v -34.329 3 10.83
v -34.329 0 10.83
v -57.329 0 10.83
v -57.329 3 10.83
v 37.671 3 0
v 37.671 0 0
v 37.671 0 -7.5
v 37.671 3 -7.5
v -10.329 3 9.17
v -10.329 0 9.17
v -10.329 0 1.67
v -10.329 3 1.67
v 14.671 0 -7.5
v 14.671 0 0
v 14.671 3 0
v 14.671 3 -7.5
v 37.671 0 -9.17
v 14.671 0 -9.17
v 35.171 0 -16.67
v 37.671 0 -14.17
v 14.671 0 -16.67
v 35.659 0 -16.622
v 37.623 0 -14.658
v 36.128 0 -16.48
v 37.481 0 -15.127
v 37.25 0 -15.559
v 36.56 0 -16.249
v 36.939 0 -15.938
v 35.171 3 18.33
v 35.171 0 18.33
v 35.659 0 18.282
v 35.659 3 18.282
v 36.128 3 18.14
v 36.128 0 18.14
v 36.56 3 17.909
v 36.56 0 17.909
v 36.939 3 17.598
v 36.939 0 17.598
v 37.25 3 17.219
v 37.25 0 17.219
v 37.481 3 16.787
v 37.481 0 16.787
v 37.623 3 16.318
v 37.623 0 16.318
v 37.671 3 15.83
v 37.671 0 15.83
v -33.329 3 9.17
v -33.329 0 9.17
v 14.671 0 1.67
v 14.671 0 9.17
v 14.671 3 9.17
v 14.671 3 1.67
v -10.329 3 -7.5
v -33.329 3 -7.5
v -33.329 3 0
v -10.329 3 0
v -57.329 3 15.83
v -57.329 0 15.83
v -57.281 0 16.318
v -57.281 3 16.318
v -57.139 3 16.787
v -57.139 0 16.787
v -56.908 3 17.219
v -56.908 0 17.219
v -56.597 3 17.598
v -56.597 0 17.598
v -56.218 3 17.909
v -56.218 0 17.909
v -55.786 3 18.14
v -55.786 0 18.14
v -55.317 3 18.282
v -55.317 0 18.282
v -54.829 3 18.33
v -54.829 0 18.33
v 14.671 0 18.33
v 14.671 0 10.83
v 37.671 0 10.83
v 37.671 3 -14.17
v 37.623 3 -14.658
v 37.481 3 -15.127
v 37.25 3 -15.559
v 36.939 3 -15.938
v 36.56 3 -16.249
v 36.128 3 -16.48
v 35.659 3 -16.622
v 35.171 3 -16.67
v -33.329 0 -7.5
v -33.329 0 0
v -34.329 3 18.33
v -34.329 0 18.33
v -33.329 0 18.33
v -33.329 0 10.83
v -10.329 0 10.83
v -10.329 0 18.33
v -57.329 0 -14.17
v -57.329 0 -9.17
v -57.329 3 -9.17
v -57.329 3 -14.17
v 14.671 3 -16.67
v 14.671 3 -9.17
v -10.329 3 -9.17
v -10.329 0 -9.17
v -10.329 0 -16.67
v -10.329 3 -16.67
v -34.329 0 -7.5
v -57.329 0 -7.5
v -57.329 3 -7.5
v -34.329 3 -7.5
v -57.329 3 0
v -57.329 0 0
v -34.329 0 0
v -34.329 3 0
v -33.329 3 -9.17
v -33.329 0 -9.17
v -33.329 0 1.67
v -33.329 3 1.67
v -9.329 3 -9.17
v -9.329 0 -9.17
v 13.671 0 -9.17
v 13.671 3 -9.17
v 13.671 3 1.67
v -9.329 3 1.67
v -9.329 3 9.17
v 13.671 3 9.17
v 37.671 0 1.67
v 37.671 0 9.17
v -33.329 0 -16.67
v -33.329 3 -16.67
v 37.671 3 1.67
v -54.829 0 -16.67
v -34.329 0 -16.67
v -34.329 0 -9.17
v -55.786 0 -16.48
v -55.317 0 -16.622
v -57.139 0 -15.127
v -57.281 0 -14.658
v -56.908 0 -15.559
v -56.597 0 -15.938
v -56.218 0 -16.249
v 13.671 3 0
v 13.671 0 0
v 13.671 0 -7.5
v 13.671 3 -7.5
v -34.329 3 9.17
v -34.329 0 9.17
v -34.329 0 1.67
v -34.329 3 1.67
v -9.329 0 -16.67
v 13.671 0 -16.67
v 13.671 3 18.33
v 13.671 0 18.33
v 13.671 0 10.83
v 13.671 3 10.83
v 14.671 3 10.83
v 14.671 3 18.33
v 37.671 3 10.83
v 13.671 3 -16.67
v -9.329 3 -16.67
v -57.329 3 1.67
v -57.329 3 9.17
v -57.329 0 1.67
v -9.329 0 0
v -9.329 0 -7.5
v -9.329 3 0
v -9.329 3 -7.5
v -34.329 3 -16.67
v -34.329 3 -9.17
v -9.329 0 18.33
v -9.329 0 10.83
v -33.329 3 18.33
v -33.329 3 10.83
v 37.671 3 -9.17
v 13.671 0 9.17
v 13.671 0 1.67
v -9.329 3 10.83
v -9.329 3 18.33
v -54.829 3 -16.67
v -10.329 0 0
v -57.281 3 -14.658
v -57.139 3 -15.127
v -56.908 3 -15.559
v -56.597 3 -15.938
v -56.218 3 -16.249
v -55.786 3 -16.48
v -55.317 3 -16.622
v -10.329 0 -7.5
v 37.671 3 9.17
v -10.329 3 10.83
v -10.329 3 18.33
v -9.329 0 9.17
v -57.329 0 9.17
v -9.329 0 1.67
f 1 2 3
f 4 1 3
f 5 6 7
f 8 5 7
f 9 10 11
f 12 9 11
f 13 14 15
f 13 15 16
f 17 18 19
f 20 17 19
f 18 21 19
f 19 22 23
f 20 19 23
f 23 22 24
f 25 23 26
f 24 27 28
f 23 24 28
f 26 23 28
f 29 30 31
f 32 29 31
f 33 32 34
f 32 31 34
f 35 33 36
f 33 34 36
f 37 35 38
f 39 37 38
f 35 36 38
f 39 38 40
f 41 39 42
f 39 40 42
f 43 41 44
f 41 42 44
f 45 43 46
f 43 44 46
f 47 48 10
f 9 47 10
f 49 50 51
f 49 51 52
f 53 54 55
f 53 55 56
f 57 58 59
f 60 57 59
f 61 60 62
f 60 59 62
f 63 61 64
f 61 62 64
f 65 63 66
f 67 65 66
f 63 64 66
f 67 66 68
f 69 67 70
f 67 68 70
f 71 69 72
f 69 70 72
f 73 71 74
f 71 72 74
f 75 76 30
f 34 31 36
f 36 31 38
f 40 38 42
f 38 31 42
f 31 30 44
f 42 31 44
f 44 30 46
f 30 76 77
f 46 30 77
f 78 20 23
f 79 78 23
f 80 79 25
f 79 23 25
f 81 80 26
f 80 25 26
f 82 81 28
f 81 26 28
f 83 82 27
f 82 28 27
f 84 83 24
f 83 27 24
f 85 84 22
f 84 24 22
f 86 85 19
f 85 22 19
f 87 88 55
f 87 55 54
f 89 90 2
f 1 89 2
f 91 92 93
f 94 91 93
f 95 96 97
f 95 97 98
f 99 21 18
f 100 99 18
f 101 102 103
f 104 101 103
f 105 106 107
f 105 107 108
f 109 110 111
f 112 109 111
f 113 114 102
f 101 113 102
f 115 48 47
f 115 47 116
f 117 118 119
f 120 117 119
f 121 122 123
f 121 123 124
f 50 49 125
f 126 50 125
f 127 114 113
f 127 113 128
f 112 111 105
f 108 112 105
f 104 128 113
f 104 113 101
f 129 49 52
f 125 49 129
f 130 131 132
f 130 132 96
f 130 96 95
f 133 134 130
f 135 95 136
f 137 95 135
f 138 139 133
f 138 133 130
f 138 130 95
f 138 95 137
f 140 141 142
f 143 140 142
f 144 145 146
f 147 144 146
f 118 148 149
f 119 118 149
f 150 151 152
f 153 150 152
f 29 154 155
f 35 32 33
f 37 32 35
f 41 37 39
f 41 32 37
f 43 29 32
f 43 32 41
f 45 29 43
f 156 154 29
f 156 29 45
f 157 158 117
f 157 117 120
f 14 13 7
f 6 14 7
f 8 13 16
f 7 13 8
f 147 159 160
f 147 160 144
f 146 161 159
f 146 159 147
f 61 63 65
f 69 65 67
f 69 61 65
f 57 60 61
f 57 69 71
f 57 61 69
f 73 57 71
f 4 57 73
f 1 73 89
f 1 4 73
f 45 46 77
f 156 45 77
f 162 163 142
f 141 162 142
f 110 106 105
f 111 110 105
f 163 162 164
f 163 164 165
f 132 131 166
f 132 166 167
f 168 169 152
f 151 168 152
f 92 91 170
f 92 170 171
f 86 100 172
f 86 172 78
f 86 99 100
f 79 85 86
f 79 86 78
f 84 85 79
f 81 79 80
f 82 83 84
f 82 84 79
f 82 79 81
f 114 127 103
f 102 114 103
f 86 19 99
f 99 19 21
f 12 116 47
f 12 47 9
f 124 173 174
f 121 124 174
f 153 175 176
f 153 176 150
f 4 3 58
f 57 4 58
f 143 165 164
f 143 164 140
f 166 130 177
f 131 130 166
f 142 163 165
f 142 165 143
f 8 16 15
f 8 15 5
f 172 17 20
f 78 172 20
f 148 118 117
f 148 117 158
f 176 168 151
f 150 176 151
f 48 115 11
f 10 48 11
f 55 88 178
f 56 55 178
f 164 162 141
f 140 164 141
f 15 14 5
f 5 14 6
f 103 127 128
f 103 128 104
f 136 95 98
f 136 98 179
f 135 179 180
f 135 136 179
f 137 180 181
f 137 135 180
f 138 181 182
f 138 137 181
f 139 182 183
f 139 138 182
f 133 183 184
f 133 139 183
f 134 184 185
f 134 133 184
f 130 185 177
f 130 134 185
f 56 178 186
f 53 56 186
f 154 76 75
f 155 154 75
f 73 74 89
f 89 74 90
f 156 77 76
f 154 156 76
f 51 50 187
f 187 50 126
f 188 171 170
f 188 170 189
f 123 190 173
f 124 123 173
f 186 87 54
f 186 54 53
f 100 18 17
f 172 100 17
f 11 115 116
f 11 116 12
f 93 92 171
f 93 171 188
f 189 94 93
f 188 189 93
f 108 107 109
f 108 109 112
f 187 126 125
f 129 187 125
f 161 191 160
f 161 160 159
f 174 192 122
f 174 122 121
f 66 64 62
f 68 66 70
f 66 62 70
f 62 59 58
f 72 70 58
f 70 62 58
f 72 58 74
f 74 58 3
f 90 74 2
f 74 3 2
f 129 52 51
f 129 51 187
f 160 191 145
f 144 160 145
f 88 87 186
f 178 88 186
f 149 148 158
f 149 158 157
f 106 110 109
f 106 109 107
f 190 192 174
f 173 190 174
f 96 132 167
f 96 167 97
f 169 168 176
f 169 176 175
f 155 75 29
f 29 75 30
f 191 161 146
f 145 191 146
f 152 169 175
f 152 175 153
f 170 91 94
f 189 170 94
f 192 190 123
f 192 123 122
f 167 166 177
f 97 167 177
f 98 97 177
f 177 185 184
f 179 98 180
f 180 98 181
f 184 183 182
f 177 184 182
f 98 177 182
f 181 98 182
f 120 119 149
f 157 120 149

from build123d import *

# Parameters (mm, degrees)
BOSS_EXTRUDE1_DEPTH    = 3
SKETCH1_W              = 23
SKETCH1_H              = 7.5
BOSS_EXTRUDE1_2_DEPTH  = 3
BOSS_EXTRUDE1_3_DEPTH  = 3
BOSS_EXTRUDE1_4_DEPTH  = 3
BOSS_EXTRUDE1_5_DEPTH  = 3
BOSS_EXTRUDE1_6_DEPTH  = 3
BOSS_EXTRUDE1_7_DEPTH  = 3
BOSS_EXTRUDE1_8_DEPTH  = 3
BOSS_EXTRUDE1_9_DEPTH  = 3
BOSS_EXTRUDE1_10_DEPTH = 3
BOSS_EXTRUDE1_11_DEPTH = 3
BOSS_EXTRUDE1_12_DEPTH = 3
BOSS_EXTRUDE1_13_DEPTH = 3
BOSS_EXTRUDE1_14_DEPTH = 3
BOSS_EXTRUDE1_15_DEPTH = 3
BOSS_EXTRUDE1_16_DEPTH = 3


with BuildPart() as part:
    # Sketch1 → Boss-Extrude1 (new body)
    with BuildSketch(Plane(origin=(0, 0, 0), x_dir=(1, 0, 0), z_dir=(0, 1, 0))):
        with BuildLine():
            Line((-54.829059829, 16.67), (-34.329059829, 16.67))
            Line((-34.329059829, 16.67), (-34.329059829, 9.17))
            Line((-34.329059829, 9.17), (-57.329059829, 9.17))
            Line((-57.329059829, 9.17), (-57.329059829, 14.17))
            ThreePointArc((-57.329059829, 14.17), (-56.596826782, 15.937766953), (-54.829059829, 16.67))
        make_face()
    extrude(amount=BOSS_EXTRUDE1_DEPTH)


with BuildPart() as body_2:
    # Sketch1 → Boss-Extrude1 2 (new body)
    with BuildSketch(Plane(origin=(0, 0, 0), x_dir=(1, 0, 0), z_dir=(0, 1, 0))):
        with Locations((-45.829059829, 3.75)):
            Rectangle(SKETCH1_W, SKETCH1_H)
    extrude(amount=BOSS_EXTRUDE1_2_DEPTH)


with BuildPart() as body_3:
    # Sketch1 → Boss-Extrude1 3 (new body)
    with BuildSketch(Plane(origin=(0, 0, 0), x_dir=(1, 0, 0), z_dir=(0, 1, 0))):
        with Locations((-45.829059829, -5.42)):
            Rectangle(SKETCH1_W, SKETCH1_H)
    extrude(amount=BOSS_EXTRUDE1_3_DEPTH)


with BuildPart() as body_4:
    # Sketch1 → Boss-Extrude1 4 (new body)
    with BuildSketch(Plane(origin=(0, 0, 0), x_dir=(1, 0, 0), z_dir=(0, 1, 0))):
        with BuildLine():
            Line((-57.329059829, -10.83), (-57.329059829, -15.83))
            ThreePointArc((-57.329059829, -15.83), (-56.596826782, -17.597766953), (-54.829059829, -18.33))
            Line((-54.829059829, -18.33), (-34.329059829, -18.33))
            Line((-34.329059829, -18.33), (-34.329059829, -10.83))
            Line((-34.329059829, -10.83), (-57.329059829, -10.83))
        make_face()
    extrude(amount=BOSS_EXTRUDE1_4_DEPTH)


with BuildPart() as body_5:
    # Sketch1 → Boss-Extrude1 5 (new body)
    with BuildSketch(Plane(origin=(0, 0, 0), x_dir=(1, 0, 0), z_dir=(0, 1, 0))):
        with Locations((-21.829059829, -14.58)):
            Rectangle(SKETCH1_W, SKETCH1_H)
    extrude(amount=BOSS_EXTRUDE1_5_DEPTH)


with BuildPart() as body_6:
    # Sketch1 → Boss-Extrude1 6 (new body)
    with BuildSketch(Plane(origin=(0, 0, 0), x_dir=(1, 0, 0), z_dir=(0, 1, 0))):
        with Locations((-21.829059829, -5.42)):
            Rectangle(SKETCH1_W, SKETCH1_H)
    extrude(amount=BOSS_EXTRUDE1_6_DEPTH)


with BuildPart() as body_7:
    # Sketch1 → Boss-Extrude1 7 (new body)
    with BuildSketch(Plane(origin=(0, 0, 0), x_dir=(1, 0, 0), z_dir=(0, 1, 0))):
        with Locations((-21.829059829, 3.75)):
            Rectangle(SKETCH1_W, SKETCH1_H)
    extrude(amount=BOSS_EXTRUDE1_7_DEPTH)


with BuildPart() as body_8:
    # Sketch1 → Boss-Extrude1 8 (new body)
    with BuildSketch(Plane(origin=(0, 0, 0), x_dir=(1, 0, 0), z_dir=(0, 1, 0))):
        with Locations((-21.829059829, 12.92)):
            Rectangle(SKETCH1_W, SKETCH1_H)
    extrude(amount=BOSS_EXTRUDE1_8_DEPTH)


with BuildPart() as body_9:
    # Sketch1 → Boss-Extrude1 9 (new body)
    with BuildSketch(Plane(origin=(0, 0, 0), x_dir=(1, 0, 0), z_dir=(0, 1, 0))):
        with Locations((2.170940171, 12.92)):
            Rectangle(SKETCH1_W, SKETCH1_H)
    extrude(amount=BOSS_EXTRUDE1_9_DEPTH)


with BuildPart() as body_10:
    # Sketch1 → Boss-Extrude1 10 (new body)
    with BuildSketch(Plane(origin=(0, 0, 0), x_dir=(1, 0, 0), z_dir=(0, 1, 0))):
        with Locations((2.170940171, 3.75)):
            Rectangle(SKETCH1_W, SKETCH1_H)
    extrude(amount=BOSS_EXTRUDE1_10_DEPTH)


with BuildPart() as body_11:
    # Sketch1 → Boss-Extrude1 11 (new body)
    with BuildSketch(Plane(origin=(0, 0, 0), x_dir=(1, 0, 0), z_dir=(0, 1, 0))):
        with Locations((2.170940171, -14.58)):
            Rectangle(SKETCH1_W, SKETCH1_H)
    extrude(amount=BOSS_EXTRUDE1_11_DEPTH)


with BuildPart() as body_12:
    # Sketch1 → Boss-Extrude1 12 (new body)
    with BuildSketch(Plane(origin=(0, 0, 0), x_dir=(1, 0, 0), z_dir=(0, 1, 0))):
        with BuildLine():
            Line((14.670940171, -18.33), (35.170940171, -18.33))
            ThreePointArc((35.170940171, -18.33), (36.938707124, -17.597766953), (37.670940171, -15.83))
            Line((37.670940171, -15.83), (37.670940171, -10.83))
            Line((37.670940171, -10.83), (14.670940171, -10.83))
            Line((14.670940171, -10.83), (14.670940171, -18.33))
        make_face()
    extrude(amount=BOSS_EXTRUDE1_12_DEPTH)


with BuildPart() as body_13:
    # Sketch1 → Boss-Extrude1 13 (new body)
    with BuildSketch(Plane(origin=(0, 0, 0), x_dir=(1, 0, 0), z_dir=(0, 1, 0))):
        with Locations((26.170940171, -5.42)):
            Rectangle(SKETCH1_W, SKETCH1_H)
    extrude(amount=BOSS_EXTRUDE1_13_DEPTH)


with BuildPart() as body_14:
    # Sketch1 → Boss-Extrude1 14 (new body)
    with BuildSketch(Plane(origin=(0, 0, 0), x_dir=(1, 0, 0), z_dir=(0, 1, 0))):
        with Locations((26.170940171, 3.75)):
            Rectangle(SKETCH1_W, SKETCH1_H)
    extrude(amount=BOSS_EXTRUDE1_14_DEPTH)


with BuildPart() as body_15:
    # Sketch1 → Boss-Extrude1 15 (new body)
    with BuildSketch(Plane(origin=(0, 0, 0), x_dir=(1, 0, 0), z_dir=(0, 1, 0))):
        with Locations((2.170940171, -5.42)):
            Rectangle(SKETCH1_W, SKETCH1_H)
    extrude(amount=BOSS_EXTRUDE1_15_DEPTH)


with BuildPart() as body_16:
    # Sketch1 → Boss-Extrude1 16 (new body)
    with BuildSketch(Plane(origin=(0, 0, 0), x_dir=(1, 0, 0), z_dir=(0, 1, 0))):
        with BuildLine():
            Line((14.670940171, 9.17), (37.670940171, 9.17))
            Line((37.670940171, 9.17), (37.670940171, 14.17))
            ThreePointArc((37.670940171, 14.17), (36.938707124, 15.937766953), (35.170940171, 16.67))
            Line((35.170940171, 16.67), (14.670940171, 16.67))
            Line((14.670940171, 16.67), (14.670940171, 9.17))
        make_face()
    extrude(amount=BOSS_EXTRUDE1_16_DEPTH)


solid = Compound([part.part, body_2.part, body_3.part, body_4.part, body_5.part, body_6.part, body_7.part, body_8.part, body_9.part, body_10.part, body_11.part, body_12.part, body_13.part, body_14.part, body_15.part, body_16.part])
